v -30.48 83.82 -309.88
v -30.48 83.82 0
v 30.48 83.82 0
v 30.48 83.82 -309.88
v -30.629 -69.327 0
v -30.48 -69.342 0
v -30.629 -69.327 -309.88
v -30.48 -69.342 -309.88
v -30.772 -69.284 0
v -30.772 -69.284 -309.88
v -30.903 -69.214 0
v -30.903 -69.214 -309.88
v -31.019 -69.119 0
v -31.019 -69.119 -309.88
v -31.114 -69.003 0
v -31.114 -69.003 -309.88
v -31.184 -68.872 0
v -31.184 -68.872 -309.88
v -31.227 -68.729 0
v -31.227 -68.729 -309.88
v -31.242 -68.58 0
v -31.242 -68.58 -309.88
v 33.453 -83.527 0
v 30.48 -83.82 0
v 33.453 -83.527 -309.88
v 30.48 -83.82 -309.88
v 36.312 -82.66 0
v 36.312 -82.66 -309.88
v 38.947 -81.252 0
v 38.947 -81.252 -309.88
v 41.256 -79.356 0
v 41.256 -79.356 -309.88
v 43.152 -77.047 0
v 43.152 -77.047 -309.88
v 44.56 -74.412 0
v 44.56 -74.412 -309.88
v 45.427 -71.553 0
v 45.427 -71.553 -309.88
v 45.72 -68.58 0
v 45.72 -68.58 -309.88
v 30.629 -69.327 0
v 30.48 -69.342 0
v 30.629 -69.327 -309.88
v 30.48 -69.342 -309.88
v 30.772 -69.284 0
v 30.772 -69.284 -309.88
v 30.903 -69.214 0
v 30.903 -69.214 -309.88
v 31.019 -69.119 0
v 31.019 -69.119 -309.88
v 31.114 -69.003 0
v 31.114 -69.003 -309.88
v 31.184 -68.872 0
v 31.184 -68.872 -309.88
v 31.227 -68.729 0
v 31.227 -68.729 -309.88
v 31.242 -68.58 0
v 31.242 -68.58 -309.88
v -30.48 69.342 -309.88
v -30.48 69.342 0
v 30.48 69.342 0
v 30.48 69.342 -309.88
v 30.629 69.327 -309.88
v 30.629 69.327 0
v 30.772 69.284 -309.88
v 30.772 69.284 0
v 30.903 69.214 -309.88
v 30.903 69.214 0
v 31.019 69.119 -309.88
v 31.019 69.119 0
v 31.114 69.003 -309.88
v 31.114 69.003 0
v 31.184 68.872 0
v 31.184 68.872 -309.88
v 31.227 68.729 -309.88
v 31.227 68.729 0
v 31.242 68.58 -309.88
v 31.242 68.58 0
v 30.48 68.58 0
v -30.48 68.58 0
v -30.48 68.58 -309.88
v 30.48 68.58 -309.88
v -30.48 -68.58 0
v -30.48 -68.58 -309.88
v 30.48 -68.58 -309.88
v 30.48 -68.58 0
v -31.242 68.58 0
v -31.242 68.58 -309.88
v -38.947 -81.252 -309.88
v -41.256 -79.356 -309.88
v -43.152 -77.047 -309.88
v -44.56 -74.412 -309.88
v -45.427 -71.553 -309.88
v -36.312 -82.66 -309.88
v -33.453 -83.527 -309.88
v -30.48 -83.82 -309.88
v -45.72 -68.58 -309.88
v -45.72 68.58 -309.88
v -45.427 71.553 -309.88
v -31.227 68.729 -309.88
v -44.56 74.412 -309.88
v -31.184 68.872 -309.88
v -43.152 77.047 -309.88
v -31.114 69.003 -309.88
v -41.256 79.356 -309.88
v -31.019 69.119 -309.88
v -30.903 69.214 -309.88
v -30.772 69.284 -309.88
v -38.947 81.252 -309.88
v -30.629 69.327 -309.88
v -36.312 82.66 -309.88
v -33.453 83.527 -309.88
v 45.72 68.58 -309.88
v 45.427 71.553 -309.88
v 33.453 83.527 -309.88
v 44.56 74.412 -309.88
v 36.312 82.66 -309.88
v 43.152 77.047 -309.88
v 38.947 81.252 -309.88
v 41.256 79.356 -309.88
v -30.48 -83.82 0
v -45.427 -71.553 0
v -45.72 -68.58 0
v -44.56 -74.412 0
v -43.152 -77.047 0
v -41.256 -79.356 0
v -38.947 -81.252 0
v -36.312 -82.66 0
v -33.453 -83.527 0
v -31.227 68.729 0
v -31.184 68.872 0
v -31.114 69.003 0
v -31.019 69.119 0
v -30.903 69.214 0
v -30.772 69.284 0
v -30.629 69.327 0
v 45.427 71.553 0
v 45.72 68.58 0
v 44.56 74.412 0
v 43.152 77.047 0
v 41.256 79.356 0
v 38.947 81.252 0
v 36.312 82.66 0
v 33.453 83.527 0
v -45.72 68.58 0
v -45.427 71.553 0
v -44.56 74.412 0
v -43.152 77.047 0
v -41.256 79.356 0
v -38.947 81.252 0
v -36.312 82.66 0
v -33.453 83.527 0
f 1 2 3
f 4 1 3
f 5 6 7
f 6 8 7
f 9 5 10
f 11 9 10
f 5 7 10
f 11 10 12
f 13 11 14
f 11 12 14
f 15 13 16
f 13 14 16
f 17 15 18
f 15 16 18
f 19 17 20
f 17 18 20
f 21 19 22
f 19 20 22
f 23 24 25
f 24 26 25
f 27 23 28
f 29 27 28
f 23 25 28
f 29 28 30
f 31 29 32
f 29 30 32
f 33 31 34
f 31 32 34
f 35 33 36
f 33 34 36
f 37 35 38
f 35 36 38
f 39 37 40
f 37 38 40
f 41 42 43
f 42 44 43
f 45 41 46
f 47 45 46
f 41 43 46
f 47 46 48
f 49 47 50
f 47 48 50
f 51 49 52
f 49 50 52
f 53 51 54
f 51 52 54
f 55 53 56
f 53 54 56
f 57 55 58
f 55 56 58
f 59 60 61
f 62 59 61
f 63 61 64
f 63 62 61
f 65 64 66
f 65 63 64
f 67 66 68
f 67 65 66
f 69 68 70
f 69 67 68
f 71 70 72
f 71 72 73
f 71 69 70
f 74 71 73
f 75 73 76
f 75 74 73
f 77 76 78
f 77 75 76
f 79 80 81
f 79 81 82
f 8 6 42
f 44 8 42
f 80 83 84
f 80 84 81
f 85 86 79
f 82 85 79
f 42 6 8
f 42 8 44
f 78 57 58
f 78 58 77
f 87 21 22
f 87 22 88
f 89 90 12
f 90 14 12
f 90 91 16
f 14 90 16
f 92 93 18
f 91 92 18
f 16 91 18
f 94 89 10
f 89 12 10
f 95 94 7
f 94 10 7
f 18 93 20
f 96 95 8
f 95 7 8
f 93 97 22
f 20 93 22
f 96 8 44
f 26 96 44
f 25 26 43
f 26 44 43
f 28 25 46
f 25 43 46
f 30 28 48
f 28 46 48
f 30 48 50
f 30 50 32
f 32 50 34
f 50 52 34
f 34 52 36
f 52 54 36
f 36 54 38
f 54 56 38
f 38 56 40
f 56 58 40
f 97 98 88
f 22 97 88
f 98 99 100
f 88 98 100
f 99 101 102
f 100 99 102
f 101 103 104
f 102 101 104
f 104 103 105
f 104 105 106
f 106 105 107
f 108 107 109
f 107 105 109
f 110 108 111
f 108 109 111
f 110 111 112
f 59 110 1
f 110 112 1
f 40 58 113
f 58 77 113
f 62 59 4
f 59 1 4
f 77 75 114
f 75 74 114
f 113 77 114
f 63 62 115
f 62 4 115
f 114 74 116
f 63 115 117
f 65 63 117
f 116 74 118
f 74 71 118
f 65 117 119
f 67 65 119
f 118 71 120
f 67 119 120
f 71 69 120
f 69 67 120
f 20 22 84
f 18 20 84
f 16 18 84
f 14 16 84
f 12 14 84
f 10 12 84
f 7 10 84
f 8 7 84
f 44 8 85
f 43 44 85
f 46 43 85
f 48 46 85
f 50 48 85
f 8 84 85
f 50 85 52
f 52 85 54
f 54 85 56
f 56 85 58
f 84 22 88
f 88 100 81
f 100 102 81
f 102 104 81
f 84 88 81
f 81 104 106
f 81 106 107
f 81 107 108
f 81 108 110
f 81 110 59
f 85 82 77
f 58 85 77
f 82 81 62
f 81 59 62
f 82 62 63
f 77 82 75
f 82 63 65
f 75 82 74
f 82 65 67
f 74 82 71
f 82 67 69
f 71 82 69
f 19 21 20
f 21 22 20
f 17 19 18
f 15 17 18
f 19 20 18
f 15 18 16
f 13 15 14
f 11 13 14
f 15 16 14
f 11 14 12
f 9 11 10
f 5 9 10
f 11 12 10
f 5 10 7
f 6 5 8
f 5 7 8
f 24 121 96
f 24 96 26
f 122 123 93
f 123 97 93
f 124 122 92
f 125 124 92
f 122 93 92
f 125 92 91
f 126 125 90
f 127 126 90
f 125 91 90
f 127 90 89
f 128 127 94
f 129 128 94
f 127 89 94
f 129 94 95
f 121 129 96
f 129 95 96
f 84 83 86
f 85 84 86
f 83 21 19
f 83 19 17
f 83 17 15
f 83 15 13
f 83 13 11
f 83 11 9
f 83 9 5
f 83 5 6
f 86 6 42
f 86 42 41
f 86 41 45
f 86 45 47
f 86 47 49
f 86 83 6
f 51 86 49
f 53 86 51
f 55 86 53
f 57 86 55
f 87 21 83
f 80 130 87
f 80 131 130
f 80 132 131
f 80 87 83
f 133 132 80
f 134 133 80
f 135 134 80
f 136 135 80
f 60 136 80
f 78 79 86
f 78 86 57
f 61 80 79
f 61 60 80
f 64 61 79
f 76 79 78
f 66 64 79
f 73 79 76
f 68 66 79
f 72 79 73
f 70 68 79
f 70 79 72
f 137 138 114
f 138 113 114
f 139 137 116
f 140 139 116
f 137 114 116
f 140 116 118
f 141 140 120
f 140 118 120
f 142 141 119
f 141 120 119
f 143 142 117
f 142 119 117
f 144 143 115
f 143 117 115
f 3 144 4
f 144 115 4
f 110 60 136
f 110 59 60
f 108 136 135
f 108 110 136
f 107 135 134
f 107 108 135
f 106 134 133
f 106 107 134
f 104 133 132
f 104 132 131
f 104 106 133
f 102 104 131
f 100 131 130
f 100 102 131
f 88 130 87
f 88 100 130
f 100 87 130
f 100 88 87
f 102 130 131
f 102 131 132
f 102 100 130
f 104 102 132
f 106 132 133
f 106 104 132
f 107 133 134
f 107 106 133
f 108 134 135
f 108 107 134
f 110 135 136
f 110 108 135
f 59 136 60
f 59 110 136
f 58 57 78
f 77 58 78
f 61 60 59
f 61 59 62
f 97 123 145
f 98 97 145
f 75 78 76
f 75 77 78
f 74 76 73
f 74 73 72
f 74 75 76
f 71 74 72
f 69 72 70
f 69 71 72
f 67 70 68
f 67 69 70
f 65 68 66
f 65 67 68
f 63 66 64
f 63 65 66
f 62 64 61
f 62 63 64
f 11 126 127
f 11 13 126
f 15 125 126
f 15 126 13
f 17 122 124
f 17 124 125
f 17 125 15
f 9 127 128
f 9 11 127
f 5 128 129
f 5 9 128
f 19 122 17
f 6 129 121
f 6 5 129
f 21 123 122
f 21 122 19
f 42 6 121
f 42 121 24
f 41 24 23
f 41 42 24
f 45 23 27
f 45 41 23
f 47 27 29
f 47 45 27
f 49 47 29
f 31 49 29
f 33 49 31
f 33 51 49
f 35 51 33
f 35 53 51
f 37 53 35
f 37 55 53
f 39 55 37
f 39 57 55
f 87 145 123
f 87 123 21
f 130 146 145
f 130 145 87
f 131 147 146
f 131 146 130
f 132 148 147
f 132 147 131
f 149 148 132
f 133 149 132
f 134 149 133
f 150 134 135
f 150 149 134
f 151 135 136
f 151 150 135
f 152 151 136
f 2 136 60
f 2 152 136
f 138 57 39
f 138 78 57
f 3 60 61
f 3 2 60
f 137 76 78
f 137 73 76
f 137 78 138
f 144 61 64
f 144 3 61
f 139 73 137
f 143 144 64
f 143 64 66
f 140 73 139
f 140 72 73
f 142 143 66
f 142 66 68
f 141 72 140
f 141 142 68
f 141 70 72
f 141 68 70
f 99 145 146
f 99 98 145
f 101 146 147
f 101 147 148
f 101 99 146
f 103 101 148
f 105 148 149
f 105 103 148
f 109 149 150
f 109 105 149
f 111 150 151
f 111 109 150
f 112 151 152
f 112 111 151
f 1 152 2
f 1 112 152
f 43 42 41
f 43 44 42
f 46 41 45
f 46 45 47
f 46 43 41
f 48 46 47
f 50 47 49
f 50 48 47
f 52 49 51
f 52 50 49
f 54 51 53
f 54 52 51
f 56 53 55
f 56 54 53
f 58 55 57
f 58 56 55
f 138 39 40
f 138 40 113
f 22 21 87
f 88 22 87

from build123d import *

# Parameters (mm, degrees)
F5_W      = 91.44
F5_H      = 167.64
F6_DEPTH  = 309.88
F7_R      = 15.24
F8_W      = 62.484
F8_H      = 138.684
F9_DEPTH  = 309.88
F10_W     = 62.484
F10_H     = 138.684
F11_DEPTH = 309.88
F12_W     = 60.96
F12_H     = 137.16
F13_DEPTH = 309.88
F14_R     = 0.762
F15_R     = 0.762


with BuildPart() as f6:
    # F5 (on Top) → F6 (new body)
    with BuildSketch(Plane.XY):
        Rectangle(F5_W, F5_H)
    extrude(amount=-F6_DEPTH)

    # F7
    f7_edges = [f6.edges().sort_by_distance(p)[0] for p in [
        (-45.72, 83.82, -154.94),
        (45.72, 83.82, -154.94),
        (45.72, -83.82, -154.94),
        (-45.72, -83.82, -154.94),
    ]]
    fillet(f7_edges, radius=F7_R)

    # F8 (on face) → F9 (cut)
    with BuildSketch(Plane.XY):
        Rectangle(F8_W, F8_H)
    extrude(amount=-F9_DEPTH, mode=Mode.SUBTRACT)

    # F15
    f15_edges = [f6.edges().sort_by_distance(p)[0] for p in [
        (-31.242, 69.342, -154.94),
        (-31.242, -69.342, -154.94),
        (31.242, -69.342, -154.94),
        (31.242, 69.342, -154.94),
    ]]
    fillet(f15_edges, radius=F15_R)


with BuildPart() as f11:
    # F10 (on face) → F11 (new body)
    with BuildSketch(Plane.XY):
        Rectangle(F10_W, F10_H)
    extrude(amount=-F11_DEPTH)

    # F12 (on face) → F13 (cut)
    with BuildSketch(Plane.XY):
        Rectangle(F12_W, F12_H)
    extrude(amount=-F13_DEPTH, mode=Mode.SUBTRACT)

    # F14
    f14_edges = [f11.edges().sort_by_distance(p)[0] for p in [
        (-31.242, 69.342, -154.94),
        (31.242, 69.342, -154.94),
        (31.242, -69.342, -154.94),
        (-31.242, -69.342, -154.94),
    ]]
    fillet(f14_edges, radius=F14_R)


solid = Compound([f6.part, f11.part])
